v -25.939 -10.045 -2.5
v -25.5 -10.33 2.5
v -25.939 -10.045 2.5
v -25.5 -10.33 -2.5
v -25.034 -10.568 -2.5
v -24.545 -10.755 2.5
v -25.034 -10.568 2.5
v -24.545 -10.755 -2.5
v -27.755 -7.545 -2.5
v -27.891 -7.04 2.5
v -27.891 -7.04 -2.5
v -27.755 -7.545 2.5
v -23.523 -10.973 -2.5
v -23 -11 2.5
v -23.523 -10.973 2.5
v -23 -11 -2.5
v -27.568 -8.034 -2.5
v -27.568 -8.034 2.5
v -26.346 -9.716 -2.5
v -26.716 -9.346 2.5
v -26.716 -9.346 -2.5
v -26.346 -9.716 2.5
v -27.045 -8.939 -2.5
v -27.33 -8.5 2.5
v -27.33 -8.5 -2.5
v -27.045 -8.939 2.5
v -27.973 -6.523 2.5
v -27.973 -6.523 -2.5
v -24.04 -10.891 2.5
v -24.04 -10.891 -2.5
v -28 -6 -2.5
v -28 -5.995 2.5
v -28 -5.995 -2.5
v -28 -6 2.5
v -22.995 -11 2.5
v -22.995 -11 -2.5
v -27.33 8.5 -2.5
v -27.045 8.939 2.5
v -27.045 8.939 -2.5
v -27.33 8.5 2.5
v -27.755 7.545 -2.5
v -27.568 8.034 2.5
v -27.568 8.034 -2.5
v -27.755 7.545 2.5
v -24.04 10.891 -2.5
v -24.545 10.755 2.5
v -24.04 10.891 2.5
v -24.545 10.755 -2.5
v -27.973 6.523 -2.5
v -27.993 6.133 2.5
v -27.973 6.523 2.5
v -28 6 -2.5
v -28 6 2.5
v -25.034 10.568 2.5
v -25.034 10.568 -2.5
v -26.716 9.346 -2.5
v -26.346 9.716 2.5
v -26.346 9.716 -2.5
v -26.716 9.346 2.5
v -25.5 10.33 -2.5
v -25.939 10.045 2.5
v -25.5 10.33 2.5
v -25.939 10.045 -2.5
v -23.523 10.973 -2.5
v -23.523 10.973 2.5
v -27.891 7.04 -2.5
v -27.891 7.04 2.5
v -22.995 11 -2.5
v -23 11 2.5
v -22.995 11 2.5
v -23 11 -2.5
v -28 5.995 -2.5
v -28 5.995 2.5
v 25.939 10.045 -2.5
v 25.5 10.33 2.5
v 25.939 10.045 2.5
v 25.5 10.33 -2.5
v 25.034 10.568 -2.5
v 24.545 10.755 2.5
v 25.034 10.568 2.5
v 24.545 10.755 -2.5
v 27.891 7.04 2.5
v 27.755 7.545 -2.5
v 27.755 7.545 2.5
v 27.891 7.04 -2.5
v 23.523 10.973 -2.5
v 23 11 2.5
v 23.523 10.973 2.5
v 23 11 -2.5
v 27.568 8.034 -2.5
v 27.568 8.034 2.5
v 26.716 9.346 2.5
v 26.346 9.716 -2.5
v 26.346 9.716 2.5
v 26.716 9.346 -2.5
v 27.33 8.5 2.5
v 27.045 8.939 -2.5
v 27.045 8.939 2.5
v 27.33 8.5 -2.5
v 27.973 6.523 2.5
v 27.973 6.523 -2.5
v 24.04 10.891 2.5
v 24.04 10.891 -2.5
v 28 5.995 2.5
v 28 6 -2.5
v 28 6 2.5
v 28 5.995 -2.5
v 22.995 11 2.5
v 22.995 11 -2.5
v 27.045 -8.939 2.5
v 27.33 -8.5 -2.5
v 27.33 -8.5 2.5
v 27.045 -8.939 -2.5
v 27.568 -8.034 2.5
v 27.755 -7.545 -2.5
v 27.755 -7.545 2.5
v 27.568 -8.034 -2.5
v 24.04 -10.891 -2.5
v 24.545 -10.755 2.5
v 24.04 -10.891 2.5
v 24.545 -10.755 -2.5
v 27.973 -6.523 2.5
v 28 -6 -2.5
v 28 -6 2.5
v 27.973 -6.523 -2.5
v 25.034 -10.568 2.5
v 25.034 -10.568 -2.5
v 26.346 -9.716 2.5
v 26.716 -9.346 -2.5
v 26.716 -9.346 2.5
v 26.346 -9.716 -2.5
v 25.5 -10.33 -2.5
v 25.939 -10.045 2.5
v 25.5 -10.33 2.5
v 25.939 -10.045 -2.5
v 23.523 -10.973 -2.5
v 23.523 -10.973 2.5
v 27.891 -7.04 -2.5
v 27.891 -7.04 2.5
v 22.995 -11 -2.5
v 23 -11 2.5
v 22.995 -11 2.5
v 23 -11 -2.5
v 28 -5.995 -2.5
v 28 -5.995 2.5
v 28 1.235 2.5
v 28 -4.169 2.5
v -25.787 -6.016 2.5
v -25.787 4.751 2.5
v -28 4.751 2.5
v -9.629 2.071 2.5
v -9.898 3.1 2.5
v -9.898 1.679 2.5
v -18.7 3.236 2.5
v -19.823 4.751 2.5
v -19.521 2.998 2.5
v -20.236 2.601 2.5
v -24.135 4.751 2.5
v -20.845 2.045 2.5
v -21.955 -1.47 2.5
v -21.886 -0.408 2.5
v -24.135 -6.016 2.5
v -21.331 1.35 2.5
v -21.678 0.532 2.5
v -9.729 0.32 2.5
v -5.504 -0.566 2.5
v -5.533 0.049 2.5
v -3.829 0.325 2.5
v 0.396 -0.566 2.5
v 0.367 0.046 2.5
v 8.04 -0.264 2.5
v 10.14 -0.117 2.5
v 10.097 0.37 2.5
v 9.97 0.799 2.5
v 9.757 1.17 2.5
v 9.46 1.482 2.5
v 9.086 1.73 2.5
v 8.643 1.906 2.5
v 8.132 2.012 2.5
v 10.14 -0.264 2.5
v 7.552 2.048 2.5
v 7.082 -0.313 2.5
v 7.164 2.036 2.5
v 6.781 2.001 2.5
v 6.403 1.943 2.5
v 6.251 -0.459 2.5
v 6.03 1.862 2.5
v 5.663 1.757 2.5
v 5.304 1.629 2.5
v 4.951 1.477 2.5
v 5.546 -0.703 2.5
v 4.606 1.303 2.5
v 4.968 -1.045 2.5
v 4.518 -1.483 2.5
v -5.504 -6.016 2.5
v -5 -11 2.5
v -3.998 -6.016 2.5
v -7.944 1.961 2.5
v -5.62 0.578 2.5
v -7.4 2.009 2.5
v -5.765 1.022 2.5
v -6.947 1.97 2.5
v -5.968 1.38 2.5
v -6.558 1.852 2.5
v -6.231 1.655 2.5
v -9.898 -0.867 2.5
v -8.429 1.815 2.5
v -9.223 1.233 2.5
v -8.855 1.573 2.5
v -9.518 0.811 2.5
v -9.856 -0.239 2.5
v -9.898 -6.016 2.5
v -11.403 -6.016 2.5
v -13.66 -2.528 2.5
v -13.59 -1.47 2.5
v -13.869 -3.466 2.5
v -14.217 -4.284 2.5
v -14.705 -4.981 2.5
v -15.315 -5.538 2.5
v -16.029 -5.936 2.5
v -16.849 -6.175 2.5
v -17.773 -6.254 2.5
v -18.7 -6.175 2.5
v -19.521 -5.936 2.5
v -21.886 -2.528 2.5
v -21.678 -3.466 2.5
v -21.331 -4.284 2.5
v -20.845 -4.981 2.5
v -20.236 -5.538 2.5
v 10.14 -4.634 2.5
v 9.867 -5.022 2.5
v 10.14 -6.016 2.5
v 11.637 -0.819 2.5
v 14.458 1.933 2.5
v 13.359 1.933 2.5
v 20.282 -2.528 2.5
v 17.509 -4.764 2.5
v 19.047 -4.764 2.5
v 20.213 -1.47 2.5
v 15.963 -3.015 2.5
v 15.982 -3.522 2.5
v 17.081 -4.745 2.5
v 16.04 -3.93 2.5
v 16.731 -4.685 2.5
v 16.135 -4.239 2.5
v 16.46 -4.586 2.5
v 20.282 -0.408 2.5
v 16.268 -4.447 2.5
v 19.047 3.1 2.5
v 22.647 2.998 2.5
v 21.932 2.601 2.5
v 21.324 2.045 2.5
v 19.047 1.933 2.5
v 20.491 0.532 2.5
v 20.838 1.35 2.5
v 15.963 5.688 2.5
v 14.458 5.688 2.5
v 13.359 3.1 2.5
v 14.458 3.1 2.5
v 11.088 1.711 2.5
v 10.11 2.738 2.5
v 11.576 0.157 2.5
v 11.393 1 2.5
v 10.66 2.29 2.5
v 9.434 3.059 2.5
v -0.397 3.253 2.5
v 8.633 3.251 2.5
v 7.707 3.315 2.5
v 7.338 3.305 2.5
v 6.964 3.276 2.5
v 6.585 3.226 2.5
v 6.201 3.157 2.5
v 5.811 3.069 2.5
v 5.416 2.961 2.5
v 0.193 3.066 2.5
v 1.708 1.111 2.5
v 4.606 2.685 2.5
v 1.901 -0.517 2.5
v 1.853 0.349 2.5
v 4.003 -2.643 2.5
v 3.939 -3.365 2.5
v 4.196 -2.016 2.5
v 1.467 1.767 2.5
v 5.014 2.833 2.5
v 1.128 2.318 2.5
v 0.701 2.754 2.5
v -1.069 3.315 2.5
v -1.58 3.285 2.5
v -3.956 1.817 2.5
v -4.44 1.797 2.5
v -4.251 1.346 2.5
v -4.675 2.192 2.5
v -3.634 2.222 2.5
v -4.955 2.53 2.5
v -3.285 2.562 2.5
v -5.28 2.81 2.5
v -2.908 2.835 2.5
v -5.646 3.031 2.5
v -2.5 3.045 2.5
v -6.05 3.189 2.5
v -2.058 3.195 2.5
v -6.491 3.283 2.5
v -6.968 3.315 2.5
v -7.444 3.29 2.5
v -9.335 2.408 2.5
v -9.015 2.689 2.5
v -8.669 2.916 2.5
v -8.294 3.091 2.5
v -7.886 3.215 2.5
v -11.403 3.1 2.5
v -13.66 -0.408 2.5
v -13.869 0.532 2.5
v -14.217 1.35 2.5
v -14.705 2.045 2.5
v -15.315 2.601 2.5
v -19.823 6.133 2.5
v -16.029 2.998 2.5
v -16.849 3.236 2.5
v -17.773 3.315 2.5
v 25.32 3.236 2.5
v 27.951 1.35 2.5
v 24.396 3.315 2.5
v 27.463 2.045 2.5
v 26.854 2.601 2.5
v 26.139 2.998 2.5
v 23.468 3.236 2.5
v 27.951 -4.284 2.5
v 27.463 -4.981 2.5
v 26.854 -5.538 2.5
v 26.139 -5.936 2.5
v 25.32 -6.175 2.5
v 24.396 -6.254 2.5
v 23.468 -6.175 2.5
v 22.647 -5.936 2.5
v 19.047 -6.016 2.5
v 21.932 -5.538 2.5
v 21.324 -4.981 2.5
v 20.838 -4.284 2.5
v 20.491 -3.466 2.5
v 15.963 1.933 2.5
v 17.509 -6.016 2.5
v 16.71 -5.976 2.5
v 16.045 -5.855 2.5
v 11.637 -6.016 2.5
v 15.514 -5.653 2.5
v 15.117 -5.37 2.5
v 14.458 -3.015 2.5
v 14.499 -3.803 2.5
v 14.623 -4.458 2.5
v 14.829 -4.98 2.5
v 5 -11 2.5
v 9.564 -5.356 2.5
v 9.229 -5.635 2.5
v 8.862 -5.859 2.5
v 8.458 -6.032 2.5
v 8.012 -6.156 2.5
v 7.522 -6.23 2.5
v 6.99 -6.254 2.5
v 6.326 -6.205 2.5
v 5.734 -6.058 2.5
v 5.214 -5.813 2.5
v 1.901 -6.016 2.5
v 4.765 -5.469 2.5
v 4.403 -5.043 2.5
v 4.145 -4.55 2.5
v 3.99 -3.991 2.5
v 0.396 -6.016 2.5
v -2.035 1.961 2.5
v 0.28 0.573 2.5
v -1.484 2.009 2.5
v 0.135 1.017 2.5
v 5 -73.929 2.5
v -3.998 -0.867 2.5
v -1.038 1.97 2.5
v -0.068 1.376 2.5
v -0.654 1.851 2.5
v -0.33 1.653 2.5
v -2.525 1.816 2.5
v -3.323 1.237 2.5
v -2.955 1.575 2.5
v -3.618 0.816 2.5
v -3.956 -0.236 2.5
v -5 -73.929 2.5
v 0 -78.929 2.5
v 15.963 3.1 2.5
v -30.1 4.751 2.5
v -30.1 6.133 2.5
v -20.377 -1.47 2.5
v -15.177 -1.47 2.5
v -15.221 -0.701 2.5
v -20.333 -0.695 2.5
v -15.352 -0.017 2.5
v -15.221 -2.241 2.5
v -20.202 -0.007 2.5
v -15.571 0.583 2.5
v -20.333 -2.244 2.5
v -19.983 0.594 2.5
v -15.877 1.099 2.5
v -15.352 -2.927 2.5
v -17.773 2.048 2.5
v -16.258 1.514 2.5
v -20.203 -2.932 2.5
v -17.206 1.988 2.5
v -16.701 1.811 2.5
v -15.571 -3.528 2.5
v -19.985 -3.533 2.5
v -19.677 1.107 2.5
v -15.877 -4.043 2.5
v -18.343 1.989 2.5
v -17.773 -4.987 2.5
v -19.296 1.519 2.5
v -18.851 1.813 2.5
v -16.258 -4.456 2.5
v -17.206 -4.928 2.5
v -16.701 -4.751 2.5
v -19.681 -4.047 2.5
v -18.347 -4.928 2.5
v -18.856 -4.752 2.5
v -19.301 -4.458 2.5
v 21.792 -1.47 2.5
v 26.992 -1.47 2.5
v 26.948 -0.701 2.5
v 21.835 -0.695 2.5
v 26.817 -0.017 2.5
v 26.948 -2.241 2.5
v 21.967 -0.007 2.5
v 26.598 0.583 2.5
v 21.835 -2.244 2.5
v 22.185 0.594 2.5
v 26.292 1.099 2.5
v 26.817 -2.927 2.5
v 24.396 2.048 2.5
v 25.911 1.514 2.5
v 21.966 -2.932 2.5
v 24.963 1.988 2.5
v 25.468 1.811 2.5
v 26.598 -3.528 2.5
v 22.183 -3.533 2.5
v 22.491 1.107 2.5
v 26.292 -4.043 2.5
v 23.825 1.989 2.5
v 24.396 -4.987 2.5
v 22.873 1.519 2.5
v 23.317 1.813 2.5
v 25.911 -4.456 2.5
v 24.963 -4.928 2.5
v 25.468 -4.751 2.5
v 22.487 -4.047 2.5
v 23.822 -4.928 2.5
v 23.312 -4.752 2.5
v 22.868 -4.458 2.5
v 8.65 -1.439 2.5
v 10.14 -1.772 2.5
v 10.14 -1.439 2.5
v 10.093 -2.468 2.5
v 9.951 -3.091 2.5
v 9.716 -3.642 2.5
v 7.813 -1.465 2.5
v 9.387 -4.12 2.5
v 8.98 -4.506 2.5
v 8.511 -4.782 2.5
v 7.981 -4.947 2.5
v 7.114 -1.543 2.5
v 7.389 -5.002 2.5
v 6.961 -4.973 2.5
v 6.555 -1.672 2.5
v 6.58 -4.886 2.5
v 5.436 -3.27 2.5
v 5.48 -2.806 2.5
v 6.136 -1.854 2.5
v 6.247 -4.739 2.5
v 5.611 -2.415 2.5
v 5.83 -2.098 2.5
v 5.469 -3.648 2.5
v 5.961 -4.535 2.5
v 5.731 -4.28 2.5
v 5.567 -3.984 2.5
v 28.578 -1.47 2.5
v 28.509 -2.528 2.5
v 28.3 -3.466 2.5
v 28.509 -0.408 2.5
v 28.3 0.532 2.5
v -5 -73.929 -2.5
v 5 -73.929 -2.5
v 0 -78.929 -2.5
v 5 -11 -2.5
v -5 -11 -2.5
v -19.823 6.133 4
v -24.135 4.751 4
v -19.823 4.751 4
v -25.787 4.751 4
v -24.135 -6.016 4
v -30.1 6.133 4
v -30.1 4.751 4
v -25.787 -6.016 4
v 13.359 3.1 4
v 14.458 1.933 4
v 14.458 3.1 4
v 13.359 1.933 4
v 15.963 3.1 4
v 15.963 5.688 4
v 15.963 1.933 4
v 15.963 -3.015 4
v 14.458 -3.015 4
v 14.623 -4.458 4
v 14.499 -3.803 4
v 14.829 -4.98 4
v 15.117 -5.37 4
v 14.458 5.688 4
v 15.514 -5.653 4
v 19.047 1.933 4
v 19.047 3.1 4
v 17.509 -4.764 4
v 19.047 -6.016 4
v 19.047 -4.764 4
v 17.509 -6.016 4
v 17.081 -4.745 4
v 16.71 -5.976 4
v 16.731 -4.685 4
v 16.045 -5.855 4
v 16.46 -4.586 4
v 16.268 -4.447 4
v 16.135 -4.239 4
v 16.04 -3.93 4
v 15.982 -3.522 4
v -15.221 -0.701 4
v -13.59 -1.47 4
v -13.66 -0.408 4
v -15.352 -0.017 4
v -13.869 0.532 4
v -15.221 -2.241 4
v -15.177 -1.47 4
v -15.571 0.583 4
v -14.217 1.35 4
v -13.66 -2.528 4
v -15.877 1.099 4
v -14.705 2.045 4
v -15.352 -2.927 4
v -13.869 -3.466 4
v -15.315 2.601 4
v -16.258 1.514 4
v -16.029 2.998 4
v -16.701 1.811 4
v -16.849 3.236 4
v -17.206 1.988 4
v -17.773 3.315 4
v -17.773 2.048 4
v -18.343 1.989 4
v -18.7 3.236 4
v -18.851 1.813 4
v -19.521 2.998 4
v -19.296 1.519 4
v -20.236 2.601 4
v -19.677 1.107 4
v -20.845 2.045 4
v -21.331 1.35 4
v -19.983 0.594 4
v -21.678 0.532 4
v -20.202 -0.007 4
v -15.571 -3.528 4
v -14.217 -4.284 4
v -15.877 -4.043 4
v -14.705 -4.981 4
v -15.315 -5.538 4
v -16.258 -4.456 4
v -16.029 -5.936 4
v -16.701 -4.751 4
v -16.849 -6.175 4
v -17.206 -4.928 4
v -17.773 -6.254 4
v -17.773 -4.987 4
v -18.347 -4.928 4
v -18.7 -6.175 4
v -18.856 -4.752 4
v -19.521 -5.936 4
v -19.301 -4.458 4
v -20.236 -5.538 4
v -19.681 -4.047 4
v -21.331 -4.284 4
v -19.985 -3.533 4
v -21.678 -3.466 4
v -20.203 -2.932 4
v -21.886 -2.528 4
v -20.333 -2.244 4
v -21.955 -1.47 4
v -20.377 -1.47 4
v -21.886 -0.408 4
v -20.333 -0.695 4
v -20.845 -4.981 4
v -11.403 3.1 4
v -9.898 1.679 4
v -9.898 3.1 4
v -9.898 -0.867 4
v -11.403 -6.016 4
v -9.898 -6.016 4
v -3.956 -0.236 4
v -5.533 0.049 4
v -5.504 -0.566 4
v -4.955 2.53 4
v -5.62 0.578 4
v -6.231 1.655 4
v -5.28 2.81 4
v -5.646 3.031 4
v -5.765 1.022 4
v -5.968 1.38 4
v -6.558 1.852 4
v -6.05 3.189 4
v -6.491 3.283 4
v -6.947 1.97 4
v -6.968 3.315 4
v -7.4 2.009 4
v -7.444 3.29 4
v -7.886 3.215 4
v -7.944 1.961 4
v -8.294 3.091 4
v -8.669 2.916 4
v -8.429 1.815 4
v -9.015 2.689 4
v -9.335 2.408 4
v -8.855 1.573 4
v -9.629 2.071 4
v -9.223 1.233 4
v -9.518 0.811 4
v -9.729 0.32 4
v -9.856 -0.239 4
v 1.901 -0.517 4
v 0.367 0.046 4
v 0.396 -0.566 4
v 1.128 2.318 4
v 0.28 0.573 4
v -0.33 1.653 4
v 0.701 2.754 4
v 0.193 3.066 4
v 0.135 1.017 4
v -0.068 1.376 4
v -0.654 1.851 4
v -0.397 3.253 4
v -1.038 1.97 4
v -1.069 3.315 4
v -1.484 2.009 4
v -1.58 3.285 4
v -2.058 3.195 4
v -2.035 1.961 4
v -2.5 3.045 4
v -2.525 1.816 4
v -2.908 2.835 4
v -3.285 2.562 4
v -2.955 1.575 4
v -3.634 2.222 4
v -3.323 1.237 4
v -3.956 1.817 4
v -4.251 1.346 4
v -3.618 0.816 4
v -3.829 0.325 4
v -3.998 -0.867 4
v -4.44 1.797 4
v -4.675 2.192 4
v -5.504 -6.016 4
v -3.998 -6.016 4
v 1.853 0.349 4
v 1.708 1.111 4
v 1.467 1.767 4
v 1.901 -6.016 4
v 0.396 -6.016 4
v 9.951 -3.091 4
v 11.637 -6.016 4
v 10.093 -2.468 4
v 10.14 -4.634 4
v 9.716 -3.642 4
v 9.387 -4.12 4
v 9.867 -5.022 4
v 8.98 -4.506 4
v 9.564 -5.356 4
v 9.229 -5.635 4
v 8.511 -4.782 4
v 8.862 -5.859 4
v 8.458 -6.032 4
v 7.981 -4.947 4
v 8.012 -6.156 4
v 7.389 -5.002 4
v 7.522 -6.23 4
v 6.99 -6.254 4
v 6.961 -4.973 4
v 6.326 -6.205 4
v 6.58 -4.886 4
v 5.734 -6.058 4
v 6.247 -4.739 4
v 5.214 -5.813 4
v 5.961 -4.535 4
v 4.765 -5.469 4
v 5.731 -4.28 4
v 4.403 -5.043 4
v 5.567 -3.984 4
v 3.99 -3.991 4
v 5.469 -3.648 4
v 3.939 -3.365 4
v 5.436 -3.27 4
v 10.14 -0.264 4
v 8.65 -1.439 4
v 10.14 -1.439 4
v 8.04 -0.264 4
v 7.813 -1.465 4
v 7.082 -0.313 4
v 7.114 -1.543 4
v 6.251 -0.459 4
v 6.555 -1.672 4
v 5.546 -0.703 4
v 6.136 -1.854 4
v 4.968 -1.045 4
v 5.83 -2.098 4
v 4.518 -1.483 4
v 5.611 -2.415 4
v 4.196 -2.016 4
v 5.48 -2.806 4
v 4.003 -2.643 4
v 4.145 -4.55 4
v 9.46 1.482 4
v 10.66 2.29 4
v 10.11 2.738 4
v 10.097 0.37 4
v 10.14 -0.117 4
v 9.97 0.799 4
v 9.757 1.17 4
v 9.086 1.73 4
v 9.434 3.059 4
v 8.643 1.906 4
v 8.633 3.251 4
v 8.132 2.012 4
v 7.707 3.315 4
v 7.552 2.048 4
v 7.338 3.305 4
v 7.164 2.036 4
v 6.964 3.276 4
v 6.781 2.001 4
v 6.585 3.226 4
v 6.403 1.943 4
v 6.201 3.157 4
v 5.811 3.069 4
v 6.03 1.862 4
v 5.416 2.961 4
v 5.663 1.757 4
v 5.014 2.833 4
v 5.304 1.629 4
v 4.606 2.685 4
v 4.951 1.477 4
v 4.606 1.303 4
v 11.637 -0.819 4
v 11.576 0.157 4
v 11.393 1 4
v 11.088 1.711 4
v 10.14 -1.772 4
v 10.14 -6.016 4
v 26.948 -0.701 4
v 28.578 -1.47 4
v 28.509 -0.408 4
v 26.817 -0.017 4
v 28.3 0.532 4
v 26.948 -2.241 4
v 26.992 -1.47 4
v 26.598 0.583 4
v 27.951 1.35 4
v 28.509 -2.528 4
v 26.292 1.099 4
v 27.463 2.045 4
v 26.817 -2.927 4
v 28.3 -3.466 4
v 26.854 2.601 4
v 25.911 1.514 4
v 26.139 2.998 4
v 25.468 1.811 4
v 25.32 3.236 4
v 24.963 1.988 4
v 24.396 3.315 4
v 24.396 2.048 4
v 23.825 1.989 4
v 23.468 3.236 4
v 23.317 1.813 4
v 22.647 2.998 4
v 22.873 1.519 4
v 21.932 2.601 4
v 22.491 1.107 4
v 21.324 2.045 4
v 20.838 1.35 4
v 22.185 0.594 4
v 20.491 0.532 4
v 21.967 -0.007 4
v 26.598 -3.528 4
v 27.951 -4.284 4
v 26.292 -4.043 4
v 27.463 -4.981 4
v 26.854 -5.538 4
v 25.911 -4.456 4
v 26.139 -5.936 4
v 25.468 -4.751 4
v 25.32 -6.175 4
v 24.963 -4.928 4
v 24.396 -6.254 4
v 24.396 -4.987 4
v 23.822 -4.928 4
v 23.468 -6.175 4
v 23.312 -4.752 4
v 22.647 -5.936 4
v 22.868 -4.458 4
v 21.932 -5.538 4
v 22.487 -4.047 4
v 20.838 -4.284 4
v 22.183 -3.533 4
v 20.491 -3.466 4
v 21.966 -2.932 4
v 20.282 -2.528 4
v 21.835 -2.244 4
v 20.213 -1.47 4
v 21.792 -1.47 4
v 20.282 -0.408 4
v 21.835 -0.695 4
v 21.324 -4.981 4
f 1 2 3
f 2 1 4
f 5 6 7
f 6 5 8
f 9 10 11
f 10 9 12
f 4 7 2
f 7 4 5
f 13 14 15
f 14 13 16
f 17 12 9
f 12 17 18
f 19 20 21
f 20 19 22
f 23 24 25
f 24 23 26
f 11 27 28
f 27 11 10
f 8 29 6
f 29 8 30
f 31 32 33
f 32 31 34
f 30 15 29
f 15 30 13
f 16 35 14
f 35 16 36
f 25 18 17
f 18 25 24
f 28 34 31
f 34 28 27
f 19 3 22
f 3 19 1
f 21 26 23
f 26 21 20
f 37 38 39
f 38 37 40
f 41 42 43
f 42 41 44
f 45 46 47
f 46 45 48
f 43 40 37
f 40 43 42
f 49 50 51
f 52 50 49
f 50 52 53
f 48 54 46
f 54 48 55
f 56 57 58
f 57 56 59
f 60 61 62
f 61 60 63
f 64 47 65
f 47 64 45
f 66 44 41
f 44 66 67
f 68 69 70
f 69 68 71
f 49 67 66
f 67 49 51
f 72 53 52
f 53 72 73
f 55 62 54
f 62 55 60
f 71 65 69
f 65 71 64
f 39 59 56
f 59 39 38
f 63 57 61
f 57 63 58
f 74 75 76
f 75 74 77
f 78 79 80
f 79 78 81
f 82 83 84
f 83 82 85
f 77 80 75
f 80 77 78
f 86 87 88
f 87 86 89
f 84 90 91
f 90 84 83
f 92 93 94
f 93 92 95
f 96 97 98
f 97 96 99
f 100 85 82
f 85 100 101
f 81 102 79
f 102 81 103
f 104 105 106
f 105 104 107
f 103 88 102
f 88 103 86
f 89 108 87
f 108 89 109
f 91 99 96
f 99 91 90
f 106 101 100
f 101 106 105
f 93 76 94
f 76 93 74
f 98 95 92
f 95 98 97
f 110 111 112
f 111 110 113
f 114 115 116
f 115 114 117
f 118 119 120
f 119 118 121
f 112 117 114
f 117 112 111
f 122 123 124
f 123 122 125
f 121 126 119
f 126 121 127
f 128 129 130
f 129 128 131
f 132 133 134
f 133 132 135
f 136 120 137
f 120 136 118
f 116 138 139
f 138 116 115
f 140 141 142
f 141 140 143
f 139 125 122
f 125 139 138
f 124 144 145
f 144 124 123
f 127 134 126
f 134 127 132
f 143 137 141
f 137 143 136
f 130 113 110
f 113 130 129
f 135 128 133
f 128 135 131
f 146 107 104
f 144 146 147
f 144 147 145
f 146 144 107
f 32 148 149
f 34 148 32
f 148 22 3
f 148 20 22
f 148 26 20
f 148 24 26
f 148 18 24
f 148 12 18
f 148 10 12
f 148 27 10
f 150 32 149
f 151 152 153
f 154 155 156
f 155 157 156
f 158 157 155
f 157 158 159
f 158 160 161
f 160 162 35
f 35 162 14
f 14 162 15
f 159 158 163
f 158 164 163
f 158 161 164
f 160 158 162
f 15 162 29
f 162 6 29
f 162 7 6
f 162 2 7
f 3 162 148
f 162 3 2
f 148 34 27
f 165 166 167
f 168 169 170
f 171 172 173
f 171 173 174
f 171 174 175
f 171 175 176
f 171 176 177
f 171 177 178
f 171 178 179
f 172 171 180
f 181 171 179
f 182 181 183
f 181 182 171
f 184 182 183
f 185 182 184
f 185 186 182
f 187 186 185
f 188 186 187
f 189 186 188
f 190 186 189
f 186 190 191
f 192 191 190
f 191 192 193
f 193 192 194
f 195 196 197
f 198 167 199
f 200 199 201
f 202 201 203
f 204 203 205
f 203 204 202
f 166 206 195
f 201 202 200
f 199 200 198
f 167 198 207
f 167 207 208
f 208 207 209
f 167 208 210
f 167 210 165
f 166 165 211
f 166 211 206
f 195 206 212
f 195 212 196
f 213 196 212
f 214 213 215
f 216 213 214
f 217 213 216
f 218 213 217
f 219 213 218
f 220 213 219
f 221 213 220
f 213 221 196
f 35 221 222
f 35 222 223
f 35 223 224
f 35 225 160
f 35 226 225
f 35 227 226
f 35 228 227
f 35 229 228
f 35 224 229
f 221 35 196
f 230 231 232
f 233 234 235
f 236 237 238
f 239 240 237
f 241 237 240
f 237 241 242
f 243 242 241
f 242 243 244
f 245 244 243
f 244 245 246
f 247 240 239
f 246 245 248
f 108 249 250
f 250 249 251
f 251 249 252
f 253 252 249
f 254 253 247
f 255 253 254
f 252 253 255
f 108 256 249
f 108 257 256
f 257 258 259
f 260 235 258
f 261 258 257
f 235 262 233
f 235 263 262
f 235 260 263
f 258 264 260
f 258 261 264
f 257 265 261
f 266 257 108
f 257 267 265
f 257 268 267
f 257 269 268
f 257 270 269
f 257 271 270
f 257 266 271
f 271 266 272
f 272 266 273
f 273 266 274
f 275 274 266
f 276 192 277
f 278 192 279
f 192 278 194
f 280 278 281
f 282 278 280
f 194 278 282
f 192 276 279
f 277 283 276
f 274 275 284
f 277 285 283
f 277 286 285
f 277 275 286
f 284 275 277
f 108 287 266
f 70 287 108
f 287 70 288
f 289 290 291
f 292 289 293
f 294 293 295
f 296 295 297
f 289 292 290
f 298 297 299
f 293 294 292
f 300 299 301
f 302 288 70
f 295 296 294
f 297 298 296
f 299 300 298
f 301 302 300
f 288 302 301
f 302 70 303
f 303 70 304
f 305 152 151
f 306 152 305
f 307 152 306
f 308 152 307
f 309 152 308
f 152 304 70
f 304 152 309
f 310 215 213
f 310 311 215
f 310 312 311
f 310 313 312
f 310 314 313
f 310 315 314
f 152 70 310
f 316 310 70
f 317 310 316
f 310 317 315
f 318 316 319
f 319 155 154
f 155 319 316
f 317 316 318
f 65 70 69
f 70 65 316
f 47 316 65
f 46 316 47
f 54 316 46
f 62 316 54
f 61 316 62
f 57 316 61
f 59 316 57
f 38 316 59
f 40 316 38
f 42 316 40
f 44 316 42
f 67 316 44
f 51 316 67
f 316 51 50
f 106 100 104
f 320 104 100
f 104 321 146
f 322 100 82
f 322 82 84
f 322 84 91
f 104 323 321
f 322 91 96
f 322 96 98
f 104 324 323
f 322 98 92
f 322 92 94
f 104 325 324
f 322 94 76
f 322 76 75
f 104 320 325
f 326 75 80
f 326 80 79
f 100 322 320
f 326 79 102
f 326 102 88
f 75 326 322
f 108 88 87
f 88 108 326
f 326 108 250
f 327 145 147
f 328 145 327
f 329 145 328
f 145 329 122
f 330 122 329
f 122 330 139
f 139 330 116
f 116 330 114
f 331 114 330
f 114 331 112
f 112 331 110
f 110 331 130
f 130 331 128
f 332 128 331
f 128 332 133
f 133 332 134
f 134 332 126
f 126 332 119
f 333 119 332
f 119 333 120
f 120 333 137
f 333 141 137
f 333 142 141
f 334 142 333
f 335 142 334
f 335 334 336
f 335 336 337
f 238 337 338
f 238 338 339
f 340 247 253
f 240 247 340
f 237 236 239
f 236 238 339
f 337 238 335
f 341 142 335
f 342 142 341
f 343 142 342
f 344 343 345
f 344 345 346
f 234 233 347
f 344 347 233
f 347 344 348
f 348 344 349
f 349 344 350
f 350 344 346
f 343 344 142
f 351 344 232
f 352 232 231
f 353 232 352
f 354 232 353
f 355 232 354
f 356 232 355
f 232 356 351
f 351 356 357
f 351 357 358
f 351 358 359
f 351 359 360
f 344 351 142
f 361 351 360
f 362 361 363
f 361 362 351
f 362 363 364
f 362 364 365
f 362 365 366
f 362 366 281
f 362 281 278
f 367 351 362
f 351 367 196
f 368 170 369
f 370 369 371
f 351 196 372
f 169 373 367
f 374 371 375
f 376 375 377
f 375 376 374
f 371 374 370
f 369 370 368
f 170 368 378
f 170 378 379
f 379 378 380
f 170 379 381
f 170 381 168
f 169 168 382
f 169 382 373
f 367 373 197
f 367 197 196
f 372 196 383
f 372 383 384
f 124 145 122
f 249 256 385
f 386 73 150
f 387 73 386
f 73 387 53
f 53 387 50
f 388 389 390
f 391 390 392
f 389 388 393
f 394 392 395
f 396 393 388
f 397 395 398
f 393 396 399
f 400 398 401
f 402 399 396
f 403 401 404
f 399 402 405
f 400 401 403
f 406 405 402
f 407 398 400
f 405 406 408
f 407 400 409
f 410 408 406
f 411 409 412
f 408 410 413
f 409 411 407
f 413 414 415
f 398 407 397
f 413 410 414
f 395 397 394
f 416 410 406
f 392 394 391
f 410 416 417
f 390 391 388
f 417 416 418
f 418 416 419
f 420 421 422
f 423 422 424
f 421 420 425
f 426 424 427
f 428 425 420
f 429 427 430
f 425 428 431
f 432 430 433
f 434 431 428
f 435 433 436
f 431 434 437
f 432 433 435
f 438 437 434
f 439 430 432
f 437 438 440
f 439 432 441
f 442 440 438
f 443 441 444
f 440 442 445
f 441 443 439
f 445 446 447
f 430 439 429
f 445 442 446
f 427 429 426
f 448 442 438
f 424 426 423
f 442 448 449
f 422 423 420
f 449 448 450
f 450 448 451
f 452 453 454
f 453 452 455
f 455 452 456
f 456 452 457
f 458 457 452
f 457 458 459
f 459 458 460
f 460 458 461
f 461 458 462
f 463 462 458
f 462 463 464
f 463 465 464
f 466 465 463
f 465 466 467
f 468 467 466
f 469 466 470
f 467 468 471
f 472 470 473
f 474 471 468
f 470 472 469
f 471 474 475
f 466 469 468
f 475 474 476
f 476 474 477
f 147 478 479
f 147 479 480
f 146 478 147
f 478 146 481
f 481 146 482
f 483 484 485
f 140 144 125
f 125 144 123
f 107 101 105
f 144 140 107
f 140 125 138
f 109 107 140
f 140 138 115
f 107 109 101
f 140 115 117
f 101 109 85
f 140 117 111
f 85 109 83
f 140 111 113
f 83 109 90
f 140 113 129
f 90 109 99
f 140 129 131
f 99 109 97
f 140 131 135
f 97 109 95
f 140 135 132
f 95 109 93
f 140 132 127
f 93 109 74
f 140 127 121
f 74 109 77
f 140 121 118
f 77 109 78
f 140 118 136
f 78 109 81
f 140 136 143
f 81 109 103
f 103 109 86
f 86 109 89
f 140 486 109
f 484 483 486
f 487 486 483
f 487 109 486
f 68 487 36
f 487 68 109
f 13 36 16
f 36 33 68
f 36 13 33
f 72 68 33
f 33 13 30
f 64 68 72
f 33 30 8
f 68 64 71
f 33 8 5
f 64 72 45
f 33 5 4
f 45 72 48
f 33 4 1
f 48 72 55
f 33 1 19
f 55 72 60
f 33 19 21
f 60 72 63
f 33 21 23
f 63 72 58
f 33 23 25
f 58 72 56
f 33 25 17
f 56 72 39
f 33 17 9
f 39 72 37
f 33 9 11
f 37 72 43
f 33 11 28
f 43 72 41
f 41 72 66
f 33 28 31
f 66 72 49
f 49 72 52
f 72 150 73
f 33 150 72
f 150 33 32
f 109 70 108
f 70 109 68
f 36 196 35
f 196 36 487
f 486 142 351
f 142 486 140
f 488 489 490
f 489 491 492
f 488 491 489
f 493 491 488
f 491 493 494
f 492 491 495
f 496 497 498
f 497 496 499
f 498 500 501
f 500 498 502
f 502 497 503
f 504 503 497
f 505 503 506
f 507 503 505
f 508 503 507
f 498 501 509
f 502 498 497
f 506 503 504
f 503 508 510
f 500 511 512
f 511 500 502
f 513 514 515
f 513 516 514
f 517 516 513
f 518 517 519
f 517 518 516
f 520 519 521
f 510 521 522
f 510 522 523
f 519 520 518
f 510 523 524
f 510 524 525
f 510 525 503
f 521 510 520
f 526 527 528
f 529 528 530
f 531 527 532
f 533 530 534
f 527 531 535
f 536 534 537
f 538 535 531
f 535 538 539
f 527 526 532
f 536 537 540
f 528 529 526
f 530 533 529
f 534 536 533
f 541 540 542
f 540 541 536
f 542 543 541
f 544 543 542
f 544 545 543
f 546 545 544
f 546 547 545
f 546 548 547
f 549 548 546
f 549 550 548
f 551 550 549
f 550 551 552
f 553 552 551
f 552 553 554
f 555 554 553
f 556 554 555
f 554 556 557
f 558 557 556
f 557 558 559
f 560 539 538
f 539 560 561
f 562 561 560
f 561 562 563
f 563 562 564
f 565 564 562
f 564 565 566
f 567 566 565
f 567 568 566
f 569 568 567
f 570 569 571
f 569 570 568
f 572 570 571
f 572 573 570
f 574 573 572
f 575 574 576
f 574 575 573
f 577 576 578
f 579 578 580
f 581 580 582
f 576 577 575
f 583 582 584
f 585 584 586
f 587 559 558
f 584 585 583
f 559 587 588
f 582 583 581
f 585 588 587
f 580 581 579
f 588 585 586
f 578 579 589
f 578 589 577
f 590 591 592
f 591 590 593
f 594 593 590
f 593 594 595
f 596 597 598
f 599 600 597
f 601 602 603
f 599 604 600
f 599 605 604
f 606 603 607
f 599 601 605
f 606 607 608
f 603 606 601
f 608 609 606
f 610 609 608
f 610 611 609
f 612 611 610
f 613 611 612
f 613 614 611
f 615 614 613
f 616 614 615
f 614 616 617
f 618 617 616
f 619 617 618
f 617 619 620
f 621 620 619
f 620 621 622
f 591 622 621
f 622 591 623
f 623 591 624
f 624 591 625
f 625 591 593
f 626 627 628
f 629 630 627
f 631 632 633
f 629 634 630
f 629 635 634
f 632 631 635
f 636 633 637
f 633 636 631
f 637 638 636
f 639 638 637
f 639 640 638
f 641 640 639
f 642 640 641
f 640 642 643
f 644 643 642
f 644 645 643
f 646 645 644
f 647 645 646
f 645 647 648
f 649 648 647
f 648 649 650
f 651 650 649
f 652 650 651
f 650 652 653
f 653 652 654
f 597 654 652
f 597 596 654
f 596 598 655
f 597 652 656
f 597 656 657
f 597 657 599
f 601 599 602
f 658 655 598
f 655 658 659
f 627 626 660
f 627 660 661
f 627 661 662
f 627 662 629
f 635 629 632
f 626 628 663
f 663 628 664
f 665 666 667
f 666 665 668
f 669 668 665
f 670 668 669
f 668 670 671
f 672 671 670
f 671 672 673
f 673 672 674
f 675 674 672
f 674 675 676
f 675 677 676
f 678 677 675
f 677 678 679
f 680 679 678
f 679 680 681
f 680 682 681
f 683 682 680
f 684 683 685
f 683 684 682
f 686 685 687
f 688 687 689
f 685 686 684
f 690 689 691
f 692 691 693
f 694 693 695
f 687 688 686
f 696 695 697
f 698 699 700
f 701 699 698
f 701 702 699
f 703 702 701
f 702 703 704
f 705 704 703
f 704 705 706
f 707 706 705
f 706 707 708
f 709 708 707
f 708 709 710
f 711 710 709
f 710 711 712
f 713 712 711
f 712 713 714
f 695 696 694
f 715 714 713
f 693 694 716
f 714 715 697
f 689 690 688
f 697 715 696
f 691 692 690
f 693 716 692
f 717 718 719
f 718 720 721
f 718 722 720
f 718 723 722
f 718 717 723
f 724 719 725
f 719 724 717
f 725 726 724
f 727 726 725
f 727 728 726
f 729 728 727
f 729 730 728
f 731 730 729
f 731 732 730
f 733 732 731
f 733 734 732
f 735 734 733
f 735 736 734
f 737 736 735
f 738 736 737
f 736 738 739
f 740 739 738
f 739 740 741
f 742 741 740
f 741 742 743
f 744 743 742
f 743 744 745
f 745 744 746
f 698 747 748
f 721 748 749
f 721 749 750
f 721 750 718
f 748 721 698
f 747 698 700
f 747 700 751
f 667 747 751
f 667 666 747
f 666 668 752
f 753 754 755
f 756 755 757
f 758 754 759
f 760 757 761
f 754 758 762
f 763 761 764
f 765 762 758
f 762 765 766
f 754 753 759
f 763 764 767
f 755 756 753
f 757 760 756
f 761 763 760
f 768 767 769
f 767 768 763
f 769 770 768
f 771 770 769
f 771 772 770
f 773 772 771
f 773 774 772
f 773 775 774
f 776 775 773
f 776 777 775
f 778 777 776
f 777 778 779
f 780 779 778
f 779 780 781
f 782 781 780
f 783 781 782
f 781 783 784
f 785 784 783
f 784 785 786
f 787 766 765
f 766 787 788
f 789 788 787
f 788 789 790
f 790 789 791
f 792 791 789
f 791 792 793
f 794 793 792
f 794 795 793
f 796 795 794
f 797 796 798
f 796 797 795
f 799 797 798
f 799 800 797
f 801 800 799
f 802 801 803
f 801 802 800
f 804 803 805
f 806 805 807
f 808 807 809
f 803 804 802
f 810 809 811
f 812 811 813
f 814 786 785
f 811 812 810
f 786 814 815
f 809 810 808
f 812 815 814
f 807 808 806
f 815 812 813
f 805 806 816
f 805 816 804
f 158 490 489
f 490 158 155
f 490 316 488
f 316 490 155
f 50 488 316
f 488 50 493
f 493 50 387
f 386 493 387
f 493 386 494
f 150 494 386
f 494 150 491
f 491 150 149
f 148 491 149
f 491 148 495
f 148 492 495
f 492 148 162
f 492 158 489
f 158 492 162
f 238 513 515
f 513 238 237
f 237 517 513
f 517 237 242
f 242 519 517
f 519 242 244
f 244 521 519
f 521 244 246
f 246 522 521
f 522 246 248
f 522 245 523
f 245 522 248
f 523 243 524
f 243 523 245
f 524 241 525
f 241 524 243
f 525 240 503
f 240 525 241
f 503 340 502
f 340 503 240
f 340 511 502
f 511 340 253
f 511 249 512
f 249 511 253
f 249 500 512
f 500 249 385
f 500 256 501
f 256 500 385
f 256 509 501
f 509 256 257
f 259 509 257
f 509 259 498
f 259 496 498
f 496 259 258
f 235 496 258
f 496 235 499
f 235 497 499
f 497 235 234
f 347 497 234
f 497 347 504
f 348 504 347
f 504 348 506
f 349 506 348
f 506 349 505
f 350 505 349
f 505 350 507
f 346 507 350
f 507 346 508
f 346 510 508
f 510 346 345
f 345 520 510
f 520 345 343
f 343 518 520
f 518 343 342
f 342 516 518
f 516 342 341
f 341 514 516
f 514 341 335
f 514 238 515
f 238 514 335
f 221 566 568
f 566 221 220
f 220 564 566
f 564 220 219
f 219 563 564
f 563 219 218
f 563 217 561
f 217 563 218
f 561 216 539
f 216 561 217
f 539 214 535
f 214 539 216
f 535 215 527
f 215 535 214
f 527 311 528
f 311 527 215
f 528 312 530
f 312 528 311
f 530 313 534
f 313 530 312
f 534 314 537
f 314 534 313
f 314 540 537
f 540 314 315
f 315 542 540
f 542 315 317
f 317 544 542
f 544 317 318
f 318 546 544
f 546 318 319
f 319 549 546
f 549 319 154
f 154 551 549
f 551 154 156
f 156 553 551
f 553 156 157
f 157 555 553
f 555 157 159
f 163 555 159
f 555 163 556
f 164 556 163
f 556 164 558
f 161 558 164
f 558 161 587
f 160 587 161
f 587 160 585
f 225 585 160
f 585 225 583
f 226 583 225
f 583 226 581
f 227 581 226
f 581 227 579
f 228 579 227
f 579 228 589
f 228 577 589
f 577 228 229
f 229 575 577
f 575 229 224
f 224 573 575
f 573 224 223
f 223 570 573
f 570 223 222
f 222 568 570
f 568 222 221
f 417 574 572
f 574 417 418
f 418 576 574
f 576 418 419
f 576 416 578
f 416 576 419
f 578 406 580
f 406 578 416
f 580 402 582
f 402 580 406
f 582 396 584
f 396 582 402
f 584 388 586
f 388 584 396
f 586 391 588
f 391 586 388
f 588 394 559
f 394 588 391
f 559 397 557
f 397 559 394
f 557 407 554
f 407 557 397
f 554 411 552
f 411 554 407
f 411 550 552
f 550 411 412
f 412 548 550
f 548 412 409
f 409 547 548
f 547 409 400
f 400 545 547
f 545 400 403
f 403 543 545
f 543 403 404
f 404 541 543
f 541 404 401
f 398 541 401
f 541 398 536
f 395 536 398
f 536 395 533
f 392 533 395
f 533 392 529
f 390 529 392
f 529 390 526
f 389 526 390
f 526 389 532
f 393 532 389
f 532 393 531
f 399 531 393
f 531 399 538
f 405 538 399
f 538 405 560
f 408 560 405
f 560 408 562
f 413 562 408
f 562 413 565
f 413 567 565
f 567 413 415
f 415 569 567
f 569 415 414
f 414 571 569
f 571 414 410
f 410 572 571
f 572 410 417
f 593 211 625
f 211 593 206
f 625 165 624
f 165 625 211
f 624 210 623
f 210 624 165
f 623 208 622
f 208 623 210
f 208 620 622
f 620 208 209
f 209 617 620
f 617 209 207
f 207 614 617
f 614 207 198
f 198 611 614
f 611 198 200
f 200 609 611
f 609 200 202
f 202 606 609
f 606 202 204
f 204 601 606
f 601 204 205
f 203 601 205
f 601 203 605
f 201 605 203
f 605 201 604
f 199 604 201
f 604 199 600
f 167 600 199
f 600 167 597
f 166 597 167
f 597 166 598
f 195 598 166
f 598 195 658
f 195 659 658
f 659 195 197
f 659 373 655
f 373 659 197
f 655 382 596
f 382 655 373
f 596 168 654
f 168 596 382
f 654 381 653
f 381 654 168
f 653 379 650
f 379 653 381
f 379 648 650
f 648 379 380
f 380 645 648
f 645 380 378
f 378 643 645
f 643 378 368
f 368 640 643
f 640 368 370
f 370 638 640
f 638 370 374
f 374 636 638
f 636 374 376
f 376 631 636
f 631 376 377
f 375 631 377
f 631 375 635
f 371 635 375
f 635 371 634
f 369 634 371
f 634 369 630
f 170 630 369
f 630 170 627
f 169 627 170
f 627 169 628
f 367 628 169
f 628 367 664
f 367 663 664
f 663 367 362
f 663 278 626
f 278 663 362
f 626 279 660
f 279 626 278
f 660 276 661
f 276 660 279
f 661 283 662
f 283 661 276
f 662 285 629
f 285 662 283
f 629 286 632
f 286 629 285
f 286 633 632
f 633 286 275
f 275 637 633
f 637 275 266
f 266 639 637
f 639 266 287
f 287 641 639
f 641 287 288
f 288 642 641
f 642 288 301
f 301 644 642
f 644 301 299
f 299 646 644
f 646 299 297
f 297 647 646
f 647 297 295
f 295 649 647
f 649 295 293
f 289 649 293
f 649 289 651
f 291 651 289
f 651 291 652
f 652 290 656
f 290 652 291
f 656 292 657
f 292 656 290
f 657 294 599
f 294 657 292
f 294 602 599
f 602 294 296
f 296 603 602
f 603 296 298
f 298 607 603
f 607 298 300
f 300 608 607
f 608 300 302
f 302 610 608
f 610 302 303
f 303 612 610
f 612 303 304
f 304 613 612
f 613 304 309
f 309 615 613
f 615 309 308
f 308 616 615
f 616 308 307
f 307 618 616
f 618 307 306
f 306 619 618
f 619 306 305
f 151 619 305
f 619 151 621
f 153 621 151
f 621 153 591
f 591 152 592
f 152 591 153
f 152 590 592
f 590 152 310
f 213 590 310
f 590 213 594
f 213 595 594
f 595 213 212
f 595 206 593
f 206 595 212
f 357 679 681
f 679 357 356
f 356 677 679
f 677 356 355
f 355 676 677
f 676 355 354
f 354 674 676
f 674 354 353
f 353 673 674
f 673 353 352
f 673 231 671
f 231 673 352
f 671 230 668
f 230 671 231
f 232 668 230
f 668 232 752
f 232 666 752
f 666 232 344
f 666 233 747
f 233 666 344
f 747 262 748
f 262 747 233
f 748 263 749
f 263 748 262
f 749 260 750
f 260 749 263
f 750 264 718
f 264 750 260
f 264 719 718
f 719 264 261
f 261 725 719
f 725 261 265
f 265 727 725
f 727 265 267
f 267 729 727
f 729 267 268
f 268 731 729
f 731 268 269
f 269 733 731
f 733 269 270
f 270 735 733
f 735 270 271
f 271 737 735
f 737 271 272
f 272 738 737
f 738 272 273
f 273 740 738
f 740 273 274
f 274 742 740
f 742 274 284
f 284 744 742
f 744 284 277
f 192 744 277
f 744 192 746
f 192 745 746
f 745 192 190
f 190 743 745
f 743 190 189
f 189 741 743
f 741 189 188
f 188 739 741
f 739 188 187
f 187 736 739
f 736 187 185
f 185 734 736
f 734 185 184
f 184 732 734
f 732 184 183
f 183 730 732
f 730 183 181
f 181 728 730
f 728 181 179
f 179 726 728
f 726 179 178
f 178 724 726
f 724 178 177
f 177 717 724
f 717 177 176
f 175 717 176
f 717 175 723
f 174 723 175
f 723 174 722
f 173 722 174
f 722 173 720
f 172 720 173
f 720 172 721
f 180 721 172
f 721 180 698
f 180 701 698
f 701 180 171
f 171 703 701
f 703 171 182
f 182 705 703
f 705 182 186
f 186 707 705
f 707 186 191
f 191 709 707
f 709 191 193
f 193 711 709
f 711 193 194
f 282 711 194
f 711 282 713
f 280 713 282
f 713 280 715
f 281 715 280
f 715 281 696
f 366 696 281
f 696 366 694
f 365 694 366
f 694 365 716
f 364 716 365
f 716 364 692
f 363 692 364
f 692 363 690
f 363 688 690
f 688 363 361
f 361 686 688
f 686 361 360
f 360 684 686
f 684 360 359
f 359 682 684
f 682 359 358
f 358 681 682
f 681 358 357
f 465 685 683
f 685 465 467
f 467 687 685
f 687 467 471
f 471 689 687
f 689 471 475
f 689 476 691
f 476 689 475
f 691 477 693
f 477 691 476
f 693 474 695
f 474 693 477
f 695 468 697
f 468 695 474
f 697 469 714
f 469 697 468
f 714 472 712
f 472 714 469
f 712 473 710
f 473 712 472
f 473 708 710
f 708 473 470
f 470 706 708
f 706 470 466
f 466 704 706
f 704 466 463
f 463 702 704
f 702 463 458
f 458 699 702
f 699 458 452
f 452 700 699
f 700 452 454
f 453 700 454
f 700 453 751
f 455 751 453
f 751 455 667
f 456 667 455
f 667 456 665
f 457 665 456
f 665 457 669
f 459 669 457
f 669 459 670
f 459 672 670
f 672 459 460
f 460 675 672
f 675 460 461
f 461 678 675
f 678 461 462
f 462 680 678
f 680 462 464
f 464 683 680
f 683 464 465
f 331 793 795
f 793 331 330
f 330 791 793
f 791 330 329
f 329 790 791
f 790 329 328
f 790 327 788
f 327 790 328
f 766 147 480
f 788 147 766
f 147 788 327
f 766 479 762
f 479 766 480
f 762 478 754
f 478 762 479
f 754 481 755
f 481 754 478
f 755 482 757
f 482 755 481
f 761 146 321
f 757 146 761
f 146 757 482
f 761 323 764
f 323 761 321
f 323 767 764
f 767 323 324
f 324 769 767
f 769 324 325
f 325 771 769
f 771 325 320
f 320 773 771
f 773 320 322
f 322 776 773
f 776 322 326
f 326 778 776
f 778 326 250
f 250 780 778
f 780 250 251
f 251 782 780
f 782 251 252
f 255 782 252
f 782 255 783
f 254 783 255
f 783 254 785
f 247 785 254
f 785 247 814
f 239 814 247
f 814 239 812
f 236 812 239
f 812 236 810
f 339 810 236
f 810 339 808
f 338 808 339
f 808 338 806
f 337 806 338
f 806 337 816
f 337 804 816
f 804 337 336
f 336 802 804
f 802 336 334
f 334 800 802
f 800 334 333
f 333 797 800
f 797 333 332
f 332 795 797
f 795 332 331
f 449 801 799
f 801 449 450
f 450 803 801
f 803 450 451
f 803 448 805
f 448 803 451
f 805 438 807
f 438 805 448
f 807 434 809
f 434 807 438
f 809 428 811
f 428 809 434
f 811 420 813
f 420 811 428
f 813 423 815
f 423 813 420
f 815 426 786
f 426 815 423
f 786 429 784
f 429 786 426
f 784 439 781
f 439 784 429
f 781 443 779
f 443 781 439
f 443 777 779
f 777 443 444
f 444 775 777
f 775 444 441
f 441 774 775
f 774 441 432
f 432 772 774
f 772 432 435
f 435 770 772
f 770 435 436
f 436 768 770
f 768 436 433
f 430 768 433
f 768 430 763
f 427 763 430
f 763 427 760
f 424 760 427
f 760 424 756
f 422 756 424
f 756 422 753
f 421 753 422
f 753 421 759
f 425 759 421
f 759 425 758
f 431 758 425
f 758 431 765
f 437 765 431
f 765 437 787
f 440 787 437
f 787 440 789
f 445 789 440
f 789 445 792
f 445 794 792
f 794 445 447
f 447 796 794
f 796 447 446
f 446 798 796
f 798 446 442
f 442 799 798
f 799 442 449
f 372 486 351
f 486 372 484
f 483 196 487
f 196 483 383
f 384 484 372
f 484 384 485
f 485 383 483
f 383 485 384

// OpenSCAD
lettering = "Tomato";

// font
style = "Lobster"; //[Abril Fatface,Aclonica,Acme,Advent Pro,Akronim,Aladin,Alegreya,Alegreya Sans,Alegreya SC,Alex Brush,Alfa Slab One,Alice,Amaranth,Architects Daughter,Archivo Black,Archivo Narrow,Arimo,Arvo,Asap,Astloch,Asul,Averia Libre,Averia Serif Libre,Bangers,Basic,Belgrano,Berkshire Swash,Bigshot One,Bilbo Swash Caps,Black Ops One,Bonbon,Bowlby One SC,Brawler,Bubblegum Sans,Butterfly Kids,Cabin Condensed,Caesar Dressing,Cagliostro,Calligraffitti,Capriola,Carter One,Changa One,Chango,Chelsea Market,Cherry Cream Soda,Chewy,Chicle,Chivo,Clicker Script,Coming Soon,Concert One,Condiment,Cookie,Courgette,Covered By Your Grace,Crimson Text,Dancing Script,DejaVu Sans,DejaVu Serif,Dhurjati,Doppio One,Dosis,Droid Sans,Eagle Lake,Electrolize,Emilys Candy,Encode Sans,Encode Sans Compressed,Euphoria Script,Exo,Exo 2,Faster One,Federo,Finger Paint,Fjord One,Fontdiner Swanky,Freckle Face,Fruktur,Gabriela,Geo,Germania One,Give You Glory,Gloria Hallelujah,Goudy Bookletter 1911,Graduate,Grand Hotel,Great Vibes,Griffy,Hanalei Fill,Happy Monkey,Henny Penny,Hind,IM Fell English SC,Indie Flower,Irish Grover,Italianno,Jacques Francois Shadow,Jolly Lodger,Josefin Slab,Joti One,Judson,Just Another Hand,Kalam,Kameron,Karma,Kavoon,Knewave,Kranky,Kristi,Laila,Lakki Reddy,Lancelot,Lato,Leckerli One,Ledger,Lekton,Lemon One,Liberation Sans,Libre Caslon Text,Life Savers,Lilita One,Lily Script One,Limelight,Lobster,Lobster Two,Londrina Outline,Londrina Shadow,Londrina Solid,Lora,Love Ya Like A Sister,Loved by the King,Lovers Quarrel,Luckiest Guy,Lusitana,Macondo,Macondo Swash Caps,Mako,Marck Script,Margarine,Marko One,Maven Pro,McLaren,MedievalSharp,Merienda One,Merriweather,Mervale Script,Metal Mania,Metrophobic,Milonga,Miltonian Tattoo,Miss Fajardose,Molle,Montez,Montserrat,Mr De Haviland,Mystery Quest,Neucha,New Rocker,Niconne,Nosifer,Nothing You Could Do,Noto Sans Oriya,Noto Serif,Nova Square,Nunito,Old Standard TT,Oleo Script,Oleo Script Swash Caps,Orbitron,Oregano,Orienta,Original Surfer,Oswald,Over the Rainbow,Overlock,Oxygen,Pacifico,Paprika,Parisienne,Patrick Hand SC,Paytone One,Peralta,Permanent Marker,Piedra,Pirata One,Play,Playball,Poetsen One,Poppins,Press Start 2P,Princess Sofia,PT Mono,Qwigley,Racing Sans One,Raleway,Rancho,Ranga,Ribeye,Roboto,Roboto Condensed,Roboto Slab,Rochester,Rock Salt,Rubik One,Sail,Salsa,Sansita One,Sarina,Satisfy,Schoolbell,Seaweed Script,Sevillana,Shadows Into Light,Shadows Into Light Two,Share,Six Caps,Skranji,Source Sans Pro,Spicy Rice,Stardos Stencil,Stoke,Syncopate,Teko,Terminal Dosis,The Girl Next Door,Tillana,Timmana,Titillium Web,Ubuntu,Ultra,Underdog,UnifrakturCook,UnifrakturMaguntia,Vampiro One,Vidaloka,Viga,Voces,Volkhov,Vollkorn,Voltaire,Waiting for the Sunrise,Wallpoet,Wellfleet,Wendy One,Yellowtail,Yesteryear,Zeyada]
labelWidth = 56; //[1:300]
stickLength = 70; //[1:300]
labelHeight = 22; //[1:100]
textSpacing = 1; //[1:10]
textSize = 12; //[1:50]
textNudgeX = -4; //[-300:300]
textNudgeY = -2; //[-50:50]


textHeight = 1.5; //[1:10]


module label1() {
    difference() {
        cube ([labelWidth, labelHeight, labelDepth], center=true);
        translate([textNudgeX/10,textNudgeY/10,-(labelDepth+1)/2])
        linear_extrude(height=textHeight)
        text (lettering,  size=textSize, font = style, halign = "center", valign = "center", spacing = textSpacing);
    };
}

module label2() {
        difference(){
            if (print=="text")
                %cube ([labelWidth, labelHeight, labelDepth], center=true);
            else
                cube ([labelWidth, labelHeight, labelDepth], center=true);
            filletBlock(labelWidth,labelHeight,labelDepth);
        }
        translate([textNudgeX/10,textNudgeY/10,(labelDepth)/2])
        linear_extrude(height=textHeight)
        if (print=="stick")
            %text (lettering,  size=textSize, font = style, halign = "center", valign = "center", spacing = textSpacing);
        else
            text (lettering,  size=textSize, font = style, halign = "center", valign = "center", spacing = textSpacing);
}

module label3() {
    %difference() {
        translate([0,0,-0.5])
        cube ([labelWidth, labelHeight, labelDepth-1], center=true);
//        %translate([0,0,2*labelDepth/2+labelDepth/2-indentDepth])
//        %cube ([labelWidth-indentEdgeWidth, labelHeight-indentEdgeWidth, 2*labelDepth], center=true);
    }
    difference() {
        translate([0,0,0.5])
        cube ([labelWidth, labelHeight, labelDepth-1], center=true);
        translate([0,0,2*labelDepth/2+labelDepth/2-indentDepth])
        cube ([labelWidth-indentEdgeWidth, labelHeight-indentEdgeWidth, 2*labelDepth], center=true);
    }
    translate([textNudgeX/10,textNudgeY/10,(labelDepth)/2-indentDepth])
        linear_extrude(height=textHeight)
        text (lettering,  size=textSize, font = style, halign = "center", valign = "center", spacing = textSpacing);
}

module stick() {
    translate([0,-stickLength/2-labelHeight/2,0])
    difference() {
        cube([stickWidth,stickLength,labelDepth],center=true);
        translate([stickWidth/2,-stickLength/2,0])
        rotate([0,0,45])
        cube([stickWidth,stickWidth,labelDepth+1],center=true);
        translate([-stickWidth/2,-stickLength/2,0])
        rotate([0,0,45])
        cube([stickWidth,stickWidth,labelDepth+1],center=true);
    }
}

module filletBlock(w,h,d) {
    translate([-(w/2-2.5),-(h/2-2.5),0])
    fillet(5,d+1);   
    translate([-(w/2-2.5),(h/2-2.5),0])
    rotate([0,0,-90])
    fillet(5,d+1);   
    translate([(w/2-2.5),(h/2-2.5),0])
    rotate([0,0,180])
    fillet(5,d+1);   
    translate([(w/2-2.5),-(h/2-2.5),0])
    rotate([0,0,90])
    fillet(5,d+1);   
}
module fillet(r, h) {
    $fn = 60;
    difference() {
        cube([r + 0.01, r + 0.01, h], center = true);

        translate([r/2, r/2, 0])
            cylinder(r = r, h = h + 1, center = true);

    }
}
labelStyle = "OnTop"; //[Cutout,OnTop,Indent]
labelDepth = 5; //[1:10]
//only used for indent style; no sense to make this more than Label Depth; value =
indentDepth = 1.5;
// good idea to make this a multiple of nozzle size
indentEdgeWidth = 2.40;
stickWidth = 10; //[1:50]
oneOrTwoSticks = "One"; //[One, Two]

//print = "stick";
print = "all";


if (labelStyle == "Cutout") {
    label1();
} else if (labelStyle == "OnTop") {
    label2();
} else {
    label3();
}
    
if (oneOrTwoSticks == "One") {
    if (print=="text")
        %stick();
    else
        stick();
} else {
    translate([labelWidth/2-stickWidth/2,0,0])
    stick();
    translate([-(labelWidth/2-stickWidth/2),0,0])
    stick();
}
